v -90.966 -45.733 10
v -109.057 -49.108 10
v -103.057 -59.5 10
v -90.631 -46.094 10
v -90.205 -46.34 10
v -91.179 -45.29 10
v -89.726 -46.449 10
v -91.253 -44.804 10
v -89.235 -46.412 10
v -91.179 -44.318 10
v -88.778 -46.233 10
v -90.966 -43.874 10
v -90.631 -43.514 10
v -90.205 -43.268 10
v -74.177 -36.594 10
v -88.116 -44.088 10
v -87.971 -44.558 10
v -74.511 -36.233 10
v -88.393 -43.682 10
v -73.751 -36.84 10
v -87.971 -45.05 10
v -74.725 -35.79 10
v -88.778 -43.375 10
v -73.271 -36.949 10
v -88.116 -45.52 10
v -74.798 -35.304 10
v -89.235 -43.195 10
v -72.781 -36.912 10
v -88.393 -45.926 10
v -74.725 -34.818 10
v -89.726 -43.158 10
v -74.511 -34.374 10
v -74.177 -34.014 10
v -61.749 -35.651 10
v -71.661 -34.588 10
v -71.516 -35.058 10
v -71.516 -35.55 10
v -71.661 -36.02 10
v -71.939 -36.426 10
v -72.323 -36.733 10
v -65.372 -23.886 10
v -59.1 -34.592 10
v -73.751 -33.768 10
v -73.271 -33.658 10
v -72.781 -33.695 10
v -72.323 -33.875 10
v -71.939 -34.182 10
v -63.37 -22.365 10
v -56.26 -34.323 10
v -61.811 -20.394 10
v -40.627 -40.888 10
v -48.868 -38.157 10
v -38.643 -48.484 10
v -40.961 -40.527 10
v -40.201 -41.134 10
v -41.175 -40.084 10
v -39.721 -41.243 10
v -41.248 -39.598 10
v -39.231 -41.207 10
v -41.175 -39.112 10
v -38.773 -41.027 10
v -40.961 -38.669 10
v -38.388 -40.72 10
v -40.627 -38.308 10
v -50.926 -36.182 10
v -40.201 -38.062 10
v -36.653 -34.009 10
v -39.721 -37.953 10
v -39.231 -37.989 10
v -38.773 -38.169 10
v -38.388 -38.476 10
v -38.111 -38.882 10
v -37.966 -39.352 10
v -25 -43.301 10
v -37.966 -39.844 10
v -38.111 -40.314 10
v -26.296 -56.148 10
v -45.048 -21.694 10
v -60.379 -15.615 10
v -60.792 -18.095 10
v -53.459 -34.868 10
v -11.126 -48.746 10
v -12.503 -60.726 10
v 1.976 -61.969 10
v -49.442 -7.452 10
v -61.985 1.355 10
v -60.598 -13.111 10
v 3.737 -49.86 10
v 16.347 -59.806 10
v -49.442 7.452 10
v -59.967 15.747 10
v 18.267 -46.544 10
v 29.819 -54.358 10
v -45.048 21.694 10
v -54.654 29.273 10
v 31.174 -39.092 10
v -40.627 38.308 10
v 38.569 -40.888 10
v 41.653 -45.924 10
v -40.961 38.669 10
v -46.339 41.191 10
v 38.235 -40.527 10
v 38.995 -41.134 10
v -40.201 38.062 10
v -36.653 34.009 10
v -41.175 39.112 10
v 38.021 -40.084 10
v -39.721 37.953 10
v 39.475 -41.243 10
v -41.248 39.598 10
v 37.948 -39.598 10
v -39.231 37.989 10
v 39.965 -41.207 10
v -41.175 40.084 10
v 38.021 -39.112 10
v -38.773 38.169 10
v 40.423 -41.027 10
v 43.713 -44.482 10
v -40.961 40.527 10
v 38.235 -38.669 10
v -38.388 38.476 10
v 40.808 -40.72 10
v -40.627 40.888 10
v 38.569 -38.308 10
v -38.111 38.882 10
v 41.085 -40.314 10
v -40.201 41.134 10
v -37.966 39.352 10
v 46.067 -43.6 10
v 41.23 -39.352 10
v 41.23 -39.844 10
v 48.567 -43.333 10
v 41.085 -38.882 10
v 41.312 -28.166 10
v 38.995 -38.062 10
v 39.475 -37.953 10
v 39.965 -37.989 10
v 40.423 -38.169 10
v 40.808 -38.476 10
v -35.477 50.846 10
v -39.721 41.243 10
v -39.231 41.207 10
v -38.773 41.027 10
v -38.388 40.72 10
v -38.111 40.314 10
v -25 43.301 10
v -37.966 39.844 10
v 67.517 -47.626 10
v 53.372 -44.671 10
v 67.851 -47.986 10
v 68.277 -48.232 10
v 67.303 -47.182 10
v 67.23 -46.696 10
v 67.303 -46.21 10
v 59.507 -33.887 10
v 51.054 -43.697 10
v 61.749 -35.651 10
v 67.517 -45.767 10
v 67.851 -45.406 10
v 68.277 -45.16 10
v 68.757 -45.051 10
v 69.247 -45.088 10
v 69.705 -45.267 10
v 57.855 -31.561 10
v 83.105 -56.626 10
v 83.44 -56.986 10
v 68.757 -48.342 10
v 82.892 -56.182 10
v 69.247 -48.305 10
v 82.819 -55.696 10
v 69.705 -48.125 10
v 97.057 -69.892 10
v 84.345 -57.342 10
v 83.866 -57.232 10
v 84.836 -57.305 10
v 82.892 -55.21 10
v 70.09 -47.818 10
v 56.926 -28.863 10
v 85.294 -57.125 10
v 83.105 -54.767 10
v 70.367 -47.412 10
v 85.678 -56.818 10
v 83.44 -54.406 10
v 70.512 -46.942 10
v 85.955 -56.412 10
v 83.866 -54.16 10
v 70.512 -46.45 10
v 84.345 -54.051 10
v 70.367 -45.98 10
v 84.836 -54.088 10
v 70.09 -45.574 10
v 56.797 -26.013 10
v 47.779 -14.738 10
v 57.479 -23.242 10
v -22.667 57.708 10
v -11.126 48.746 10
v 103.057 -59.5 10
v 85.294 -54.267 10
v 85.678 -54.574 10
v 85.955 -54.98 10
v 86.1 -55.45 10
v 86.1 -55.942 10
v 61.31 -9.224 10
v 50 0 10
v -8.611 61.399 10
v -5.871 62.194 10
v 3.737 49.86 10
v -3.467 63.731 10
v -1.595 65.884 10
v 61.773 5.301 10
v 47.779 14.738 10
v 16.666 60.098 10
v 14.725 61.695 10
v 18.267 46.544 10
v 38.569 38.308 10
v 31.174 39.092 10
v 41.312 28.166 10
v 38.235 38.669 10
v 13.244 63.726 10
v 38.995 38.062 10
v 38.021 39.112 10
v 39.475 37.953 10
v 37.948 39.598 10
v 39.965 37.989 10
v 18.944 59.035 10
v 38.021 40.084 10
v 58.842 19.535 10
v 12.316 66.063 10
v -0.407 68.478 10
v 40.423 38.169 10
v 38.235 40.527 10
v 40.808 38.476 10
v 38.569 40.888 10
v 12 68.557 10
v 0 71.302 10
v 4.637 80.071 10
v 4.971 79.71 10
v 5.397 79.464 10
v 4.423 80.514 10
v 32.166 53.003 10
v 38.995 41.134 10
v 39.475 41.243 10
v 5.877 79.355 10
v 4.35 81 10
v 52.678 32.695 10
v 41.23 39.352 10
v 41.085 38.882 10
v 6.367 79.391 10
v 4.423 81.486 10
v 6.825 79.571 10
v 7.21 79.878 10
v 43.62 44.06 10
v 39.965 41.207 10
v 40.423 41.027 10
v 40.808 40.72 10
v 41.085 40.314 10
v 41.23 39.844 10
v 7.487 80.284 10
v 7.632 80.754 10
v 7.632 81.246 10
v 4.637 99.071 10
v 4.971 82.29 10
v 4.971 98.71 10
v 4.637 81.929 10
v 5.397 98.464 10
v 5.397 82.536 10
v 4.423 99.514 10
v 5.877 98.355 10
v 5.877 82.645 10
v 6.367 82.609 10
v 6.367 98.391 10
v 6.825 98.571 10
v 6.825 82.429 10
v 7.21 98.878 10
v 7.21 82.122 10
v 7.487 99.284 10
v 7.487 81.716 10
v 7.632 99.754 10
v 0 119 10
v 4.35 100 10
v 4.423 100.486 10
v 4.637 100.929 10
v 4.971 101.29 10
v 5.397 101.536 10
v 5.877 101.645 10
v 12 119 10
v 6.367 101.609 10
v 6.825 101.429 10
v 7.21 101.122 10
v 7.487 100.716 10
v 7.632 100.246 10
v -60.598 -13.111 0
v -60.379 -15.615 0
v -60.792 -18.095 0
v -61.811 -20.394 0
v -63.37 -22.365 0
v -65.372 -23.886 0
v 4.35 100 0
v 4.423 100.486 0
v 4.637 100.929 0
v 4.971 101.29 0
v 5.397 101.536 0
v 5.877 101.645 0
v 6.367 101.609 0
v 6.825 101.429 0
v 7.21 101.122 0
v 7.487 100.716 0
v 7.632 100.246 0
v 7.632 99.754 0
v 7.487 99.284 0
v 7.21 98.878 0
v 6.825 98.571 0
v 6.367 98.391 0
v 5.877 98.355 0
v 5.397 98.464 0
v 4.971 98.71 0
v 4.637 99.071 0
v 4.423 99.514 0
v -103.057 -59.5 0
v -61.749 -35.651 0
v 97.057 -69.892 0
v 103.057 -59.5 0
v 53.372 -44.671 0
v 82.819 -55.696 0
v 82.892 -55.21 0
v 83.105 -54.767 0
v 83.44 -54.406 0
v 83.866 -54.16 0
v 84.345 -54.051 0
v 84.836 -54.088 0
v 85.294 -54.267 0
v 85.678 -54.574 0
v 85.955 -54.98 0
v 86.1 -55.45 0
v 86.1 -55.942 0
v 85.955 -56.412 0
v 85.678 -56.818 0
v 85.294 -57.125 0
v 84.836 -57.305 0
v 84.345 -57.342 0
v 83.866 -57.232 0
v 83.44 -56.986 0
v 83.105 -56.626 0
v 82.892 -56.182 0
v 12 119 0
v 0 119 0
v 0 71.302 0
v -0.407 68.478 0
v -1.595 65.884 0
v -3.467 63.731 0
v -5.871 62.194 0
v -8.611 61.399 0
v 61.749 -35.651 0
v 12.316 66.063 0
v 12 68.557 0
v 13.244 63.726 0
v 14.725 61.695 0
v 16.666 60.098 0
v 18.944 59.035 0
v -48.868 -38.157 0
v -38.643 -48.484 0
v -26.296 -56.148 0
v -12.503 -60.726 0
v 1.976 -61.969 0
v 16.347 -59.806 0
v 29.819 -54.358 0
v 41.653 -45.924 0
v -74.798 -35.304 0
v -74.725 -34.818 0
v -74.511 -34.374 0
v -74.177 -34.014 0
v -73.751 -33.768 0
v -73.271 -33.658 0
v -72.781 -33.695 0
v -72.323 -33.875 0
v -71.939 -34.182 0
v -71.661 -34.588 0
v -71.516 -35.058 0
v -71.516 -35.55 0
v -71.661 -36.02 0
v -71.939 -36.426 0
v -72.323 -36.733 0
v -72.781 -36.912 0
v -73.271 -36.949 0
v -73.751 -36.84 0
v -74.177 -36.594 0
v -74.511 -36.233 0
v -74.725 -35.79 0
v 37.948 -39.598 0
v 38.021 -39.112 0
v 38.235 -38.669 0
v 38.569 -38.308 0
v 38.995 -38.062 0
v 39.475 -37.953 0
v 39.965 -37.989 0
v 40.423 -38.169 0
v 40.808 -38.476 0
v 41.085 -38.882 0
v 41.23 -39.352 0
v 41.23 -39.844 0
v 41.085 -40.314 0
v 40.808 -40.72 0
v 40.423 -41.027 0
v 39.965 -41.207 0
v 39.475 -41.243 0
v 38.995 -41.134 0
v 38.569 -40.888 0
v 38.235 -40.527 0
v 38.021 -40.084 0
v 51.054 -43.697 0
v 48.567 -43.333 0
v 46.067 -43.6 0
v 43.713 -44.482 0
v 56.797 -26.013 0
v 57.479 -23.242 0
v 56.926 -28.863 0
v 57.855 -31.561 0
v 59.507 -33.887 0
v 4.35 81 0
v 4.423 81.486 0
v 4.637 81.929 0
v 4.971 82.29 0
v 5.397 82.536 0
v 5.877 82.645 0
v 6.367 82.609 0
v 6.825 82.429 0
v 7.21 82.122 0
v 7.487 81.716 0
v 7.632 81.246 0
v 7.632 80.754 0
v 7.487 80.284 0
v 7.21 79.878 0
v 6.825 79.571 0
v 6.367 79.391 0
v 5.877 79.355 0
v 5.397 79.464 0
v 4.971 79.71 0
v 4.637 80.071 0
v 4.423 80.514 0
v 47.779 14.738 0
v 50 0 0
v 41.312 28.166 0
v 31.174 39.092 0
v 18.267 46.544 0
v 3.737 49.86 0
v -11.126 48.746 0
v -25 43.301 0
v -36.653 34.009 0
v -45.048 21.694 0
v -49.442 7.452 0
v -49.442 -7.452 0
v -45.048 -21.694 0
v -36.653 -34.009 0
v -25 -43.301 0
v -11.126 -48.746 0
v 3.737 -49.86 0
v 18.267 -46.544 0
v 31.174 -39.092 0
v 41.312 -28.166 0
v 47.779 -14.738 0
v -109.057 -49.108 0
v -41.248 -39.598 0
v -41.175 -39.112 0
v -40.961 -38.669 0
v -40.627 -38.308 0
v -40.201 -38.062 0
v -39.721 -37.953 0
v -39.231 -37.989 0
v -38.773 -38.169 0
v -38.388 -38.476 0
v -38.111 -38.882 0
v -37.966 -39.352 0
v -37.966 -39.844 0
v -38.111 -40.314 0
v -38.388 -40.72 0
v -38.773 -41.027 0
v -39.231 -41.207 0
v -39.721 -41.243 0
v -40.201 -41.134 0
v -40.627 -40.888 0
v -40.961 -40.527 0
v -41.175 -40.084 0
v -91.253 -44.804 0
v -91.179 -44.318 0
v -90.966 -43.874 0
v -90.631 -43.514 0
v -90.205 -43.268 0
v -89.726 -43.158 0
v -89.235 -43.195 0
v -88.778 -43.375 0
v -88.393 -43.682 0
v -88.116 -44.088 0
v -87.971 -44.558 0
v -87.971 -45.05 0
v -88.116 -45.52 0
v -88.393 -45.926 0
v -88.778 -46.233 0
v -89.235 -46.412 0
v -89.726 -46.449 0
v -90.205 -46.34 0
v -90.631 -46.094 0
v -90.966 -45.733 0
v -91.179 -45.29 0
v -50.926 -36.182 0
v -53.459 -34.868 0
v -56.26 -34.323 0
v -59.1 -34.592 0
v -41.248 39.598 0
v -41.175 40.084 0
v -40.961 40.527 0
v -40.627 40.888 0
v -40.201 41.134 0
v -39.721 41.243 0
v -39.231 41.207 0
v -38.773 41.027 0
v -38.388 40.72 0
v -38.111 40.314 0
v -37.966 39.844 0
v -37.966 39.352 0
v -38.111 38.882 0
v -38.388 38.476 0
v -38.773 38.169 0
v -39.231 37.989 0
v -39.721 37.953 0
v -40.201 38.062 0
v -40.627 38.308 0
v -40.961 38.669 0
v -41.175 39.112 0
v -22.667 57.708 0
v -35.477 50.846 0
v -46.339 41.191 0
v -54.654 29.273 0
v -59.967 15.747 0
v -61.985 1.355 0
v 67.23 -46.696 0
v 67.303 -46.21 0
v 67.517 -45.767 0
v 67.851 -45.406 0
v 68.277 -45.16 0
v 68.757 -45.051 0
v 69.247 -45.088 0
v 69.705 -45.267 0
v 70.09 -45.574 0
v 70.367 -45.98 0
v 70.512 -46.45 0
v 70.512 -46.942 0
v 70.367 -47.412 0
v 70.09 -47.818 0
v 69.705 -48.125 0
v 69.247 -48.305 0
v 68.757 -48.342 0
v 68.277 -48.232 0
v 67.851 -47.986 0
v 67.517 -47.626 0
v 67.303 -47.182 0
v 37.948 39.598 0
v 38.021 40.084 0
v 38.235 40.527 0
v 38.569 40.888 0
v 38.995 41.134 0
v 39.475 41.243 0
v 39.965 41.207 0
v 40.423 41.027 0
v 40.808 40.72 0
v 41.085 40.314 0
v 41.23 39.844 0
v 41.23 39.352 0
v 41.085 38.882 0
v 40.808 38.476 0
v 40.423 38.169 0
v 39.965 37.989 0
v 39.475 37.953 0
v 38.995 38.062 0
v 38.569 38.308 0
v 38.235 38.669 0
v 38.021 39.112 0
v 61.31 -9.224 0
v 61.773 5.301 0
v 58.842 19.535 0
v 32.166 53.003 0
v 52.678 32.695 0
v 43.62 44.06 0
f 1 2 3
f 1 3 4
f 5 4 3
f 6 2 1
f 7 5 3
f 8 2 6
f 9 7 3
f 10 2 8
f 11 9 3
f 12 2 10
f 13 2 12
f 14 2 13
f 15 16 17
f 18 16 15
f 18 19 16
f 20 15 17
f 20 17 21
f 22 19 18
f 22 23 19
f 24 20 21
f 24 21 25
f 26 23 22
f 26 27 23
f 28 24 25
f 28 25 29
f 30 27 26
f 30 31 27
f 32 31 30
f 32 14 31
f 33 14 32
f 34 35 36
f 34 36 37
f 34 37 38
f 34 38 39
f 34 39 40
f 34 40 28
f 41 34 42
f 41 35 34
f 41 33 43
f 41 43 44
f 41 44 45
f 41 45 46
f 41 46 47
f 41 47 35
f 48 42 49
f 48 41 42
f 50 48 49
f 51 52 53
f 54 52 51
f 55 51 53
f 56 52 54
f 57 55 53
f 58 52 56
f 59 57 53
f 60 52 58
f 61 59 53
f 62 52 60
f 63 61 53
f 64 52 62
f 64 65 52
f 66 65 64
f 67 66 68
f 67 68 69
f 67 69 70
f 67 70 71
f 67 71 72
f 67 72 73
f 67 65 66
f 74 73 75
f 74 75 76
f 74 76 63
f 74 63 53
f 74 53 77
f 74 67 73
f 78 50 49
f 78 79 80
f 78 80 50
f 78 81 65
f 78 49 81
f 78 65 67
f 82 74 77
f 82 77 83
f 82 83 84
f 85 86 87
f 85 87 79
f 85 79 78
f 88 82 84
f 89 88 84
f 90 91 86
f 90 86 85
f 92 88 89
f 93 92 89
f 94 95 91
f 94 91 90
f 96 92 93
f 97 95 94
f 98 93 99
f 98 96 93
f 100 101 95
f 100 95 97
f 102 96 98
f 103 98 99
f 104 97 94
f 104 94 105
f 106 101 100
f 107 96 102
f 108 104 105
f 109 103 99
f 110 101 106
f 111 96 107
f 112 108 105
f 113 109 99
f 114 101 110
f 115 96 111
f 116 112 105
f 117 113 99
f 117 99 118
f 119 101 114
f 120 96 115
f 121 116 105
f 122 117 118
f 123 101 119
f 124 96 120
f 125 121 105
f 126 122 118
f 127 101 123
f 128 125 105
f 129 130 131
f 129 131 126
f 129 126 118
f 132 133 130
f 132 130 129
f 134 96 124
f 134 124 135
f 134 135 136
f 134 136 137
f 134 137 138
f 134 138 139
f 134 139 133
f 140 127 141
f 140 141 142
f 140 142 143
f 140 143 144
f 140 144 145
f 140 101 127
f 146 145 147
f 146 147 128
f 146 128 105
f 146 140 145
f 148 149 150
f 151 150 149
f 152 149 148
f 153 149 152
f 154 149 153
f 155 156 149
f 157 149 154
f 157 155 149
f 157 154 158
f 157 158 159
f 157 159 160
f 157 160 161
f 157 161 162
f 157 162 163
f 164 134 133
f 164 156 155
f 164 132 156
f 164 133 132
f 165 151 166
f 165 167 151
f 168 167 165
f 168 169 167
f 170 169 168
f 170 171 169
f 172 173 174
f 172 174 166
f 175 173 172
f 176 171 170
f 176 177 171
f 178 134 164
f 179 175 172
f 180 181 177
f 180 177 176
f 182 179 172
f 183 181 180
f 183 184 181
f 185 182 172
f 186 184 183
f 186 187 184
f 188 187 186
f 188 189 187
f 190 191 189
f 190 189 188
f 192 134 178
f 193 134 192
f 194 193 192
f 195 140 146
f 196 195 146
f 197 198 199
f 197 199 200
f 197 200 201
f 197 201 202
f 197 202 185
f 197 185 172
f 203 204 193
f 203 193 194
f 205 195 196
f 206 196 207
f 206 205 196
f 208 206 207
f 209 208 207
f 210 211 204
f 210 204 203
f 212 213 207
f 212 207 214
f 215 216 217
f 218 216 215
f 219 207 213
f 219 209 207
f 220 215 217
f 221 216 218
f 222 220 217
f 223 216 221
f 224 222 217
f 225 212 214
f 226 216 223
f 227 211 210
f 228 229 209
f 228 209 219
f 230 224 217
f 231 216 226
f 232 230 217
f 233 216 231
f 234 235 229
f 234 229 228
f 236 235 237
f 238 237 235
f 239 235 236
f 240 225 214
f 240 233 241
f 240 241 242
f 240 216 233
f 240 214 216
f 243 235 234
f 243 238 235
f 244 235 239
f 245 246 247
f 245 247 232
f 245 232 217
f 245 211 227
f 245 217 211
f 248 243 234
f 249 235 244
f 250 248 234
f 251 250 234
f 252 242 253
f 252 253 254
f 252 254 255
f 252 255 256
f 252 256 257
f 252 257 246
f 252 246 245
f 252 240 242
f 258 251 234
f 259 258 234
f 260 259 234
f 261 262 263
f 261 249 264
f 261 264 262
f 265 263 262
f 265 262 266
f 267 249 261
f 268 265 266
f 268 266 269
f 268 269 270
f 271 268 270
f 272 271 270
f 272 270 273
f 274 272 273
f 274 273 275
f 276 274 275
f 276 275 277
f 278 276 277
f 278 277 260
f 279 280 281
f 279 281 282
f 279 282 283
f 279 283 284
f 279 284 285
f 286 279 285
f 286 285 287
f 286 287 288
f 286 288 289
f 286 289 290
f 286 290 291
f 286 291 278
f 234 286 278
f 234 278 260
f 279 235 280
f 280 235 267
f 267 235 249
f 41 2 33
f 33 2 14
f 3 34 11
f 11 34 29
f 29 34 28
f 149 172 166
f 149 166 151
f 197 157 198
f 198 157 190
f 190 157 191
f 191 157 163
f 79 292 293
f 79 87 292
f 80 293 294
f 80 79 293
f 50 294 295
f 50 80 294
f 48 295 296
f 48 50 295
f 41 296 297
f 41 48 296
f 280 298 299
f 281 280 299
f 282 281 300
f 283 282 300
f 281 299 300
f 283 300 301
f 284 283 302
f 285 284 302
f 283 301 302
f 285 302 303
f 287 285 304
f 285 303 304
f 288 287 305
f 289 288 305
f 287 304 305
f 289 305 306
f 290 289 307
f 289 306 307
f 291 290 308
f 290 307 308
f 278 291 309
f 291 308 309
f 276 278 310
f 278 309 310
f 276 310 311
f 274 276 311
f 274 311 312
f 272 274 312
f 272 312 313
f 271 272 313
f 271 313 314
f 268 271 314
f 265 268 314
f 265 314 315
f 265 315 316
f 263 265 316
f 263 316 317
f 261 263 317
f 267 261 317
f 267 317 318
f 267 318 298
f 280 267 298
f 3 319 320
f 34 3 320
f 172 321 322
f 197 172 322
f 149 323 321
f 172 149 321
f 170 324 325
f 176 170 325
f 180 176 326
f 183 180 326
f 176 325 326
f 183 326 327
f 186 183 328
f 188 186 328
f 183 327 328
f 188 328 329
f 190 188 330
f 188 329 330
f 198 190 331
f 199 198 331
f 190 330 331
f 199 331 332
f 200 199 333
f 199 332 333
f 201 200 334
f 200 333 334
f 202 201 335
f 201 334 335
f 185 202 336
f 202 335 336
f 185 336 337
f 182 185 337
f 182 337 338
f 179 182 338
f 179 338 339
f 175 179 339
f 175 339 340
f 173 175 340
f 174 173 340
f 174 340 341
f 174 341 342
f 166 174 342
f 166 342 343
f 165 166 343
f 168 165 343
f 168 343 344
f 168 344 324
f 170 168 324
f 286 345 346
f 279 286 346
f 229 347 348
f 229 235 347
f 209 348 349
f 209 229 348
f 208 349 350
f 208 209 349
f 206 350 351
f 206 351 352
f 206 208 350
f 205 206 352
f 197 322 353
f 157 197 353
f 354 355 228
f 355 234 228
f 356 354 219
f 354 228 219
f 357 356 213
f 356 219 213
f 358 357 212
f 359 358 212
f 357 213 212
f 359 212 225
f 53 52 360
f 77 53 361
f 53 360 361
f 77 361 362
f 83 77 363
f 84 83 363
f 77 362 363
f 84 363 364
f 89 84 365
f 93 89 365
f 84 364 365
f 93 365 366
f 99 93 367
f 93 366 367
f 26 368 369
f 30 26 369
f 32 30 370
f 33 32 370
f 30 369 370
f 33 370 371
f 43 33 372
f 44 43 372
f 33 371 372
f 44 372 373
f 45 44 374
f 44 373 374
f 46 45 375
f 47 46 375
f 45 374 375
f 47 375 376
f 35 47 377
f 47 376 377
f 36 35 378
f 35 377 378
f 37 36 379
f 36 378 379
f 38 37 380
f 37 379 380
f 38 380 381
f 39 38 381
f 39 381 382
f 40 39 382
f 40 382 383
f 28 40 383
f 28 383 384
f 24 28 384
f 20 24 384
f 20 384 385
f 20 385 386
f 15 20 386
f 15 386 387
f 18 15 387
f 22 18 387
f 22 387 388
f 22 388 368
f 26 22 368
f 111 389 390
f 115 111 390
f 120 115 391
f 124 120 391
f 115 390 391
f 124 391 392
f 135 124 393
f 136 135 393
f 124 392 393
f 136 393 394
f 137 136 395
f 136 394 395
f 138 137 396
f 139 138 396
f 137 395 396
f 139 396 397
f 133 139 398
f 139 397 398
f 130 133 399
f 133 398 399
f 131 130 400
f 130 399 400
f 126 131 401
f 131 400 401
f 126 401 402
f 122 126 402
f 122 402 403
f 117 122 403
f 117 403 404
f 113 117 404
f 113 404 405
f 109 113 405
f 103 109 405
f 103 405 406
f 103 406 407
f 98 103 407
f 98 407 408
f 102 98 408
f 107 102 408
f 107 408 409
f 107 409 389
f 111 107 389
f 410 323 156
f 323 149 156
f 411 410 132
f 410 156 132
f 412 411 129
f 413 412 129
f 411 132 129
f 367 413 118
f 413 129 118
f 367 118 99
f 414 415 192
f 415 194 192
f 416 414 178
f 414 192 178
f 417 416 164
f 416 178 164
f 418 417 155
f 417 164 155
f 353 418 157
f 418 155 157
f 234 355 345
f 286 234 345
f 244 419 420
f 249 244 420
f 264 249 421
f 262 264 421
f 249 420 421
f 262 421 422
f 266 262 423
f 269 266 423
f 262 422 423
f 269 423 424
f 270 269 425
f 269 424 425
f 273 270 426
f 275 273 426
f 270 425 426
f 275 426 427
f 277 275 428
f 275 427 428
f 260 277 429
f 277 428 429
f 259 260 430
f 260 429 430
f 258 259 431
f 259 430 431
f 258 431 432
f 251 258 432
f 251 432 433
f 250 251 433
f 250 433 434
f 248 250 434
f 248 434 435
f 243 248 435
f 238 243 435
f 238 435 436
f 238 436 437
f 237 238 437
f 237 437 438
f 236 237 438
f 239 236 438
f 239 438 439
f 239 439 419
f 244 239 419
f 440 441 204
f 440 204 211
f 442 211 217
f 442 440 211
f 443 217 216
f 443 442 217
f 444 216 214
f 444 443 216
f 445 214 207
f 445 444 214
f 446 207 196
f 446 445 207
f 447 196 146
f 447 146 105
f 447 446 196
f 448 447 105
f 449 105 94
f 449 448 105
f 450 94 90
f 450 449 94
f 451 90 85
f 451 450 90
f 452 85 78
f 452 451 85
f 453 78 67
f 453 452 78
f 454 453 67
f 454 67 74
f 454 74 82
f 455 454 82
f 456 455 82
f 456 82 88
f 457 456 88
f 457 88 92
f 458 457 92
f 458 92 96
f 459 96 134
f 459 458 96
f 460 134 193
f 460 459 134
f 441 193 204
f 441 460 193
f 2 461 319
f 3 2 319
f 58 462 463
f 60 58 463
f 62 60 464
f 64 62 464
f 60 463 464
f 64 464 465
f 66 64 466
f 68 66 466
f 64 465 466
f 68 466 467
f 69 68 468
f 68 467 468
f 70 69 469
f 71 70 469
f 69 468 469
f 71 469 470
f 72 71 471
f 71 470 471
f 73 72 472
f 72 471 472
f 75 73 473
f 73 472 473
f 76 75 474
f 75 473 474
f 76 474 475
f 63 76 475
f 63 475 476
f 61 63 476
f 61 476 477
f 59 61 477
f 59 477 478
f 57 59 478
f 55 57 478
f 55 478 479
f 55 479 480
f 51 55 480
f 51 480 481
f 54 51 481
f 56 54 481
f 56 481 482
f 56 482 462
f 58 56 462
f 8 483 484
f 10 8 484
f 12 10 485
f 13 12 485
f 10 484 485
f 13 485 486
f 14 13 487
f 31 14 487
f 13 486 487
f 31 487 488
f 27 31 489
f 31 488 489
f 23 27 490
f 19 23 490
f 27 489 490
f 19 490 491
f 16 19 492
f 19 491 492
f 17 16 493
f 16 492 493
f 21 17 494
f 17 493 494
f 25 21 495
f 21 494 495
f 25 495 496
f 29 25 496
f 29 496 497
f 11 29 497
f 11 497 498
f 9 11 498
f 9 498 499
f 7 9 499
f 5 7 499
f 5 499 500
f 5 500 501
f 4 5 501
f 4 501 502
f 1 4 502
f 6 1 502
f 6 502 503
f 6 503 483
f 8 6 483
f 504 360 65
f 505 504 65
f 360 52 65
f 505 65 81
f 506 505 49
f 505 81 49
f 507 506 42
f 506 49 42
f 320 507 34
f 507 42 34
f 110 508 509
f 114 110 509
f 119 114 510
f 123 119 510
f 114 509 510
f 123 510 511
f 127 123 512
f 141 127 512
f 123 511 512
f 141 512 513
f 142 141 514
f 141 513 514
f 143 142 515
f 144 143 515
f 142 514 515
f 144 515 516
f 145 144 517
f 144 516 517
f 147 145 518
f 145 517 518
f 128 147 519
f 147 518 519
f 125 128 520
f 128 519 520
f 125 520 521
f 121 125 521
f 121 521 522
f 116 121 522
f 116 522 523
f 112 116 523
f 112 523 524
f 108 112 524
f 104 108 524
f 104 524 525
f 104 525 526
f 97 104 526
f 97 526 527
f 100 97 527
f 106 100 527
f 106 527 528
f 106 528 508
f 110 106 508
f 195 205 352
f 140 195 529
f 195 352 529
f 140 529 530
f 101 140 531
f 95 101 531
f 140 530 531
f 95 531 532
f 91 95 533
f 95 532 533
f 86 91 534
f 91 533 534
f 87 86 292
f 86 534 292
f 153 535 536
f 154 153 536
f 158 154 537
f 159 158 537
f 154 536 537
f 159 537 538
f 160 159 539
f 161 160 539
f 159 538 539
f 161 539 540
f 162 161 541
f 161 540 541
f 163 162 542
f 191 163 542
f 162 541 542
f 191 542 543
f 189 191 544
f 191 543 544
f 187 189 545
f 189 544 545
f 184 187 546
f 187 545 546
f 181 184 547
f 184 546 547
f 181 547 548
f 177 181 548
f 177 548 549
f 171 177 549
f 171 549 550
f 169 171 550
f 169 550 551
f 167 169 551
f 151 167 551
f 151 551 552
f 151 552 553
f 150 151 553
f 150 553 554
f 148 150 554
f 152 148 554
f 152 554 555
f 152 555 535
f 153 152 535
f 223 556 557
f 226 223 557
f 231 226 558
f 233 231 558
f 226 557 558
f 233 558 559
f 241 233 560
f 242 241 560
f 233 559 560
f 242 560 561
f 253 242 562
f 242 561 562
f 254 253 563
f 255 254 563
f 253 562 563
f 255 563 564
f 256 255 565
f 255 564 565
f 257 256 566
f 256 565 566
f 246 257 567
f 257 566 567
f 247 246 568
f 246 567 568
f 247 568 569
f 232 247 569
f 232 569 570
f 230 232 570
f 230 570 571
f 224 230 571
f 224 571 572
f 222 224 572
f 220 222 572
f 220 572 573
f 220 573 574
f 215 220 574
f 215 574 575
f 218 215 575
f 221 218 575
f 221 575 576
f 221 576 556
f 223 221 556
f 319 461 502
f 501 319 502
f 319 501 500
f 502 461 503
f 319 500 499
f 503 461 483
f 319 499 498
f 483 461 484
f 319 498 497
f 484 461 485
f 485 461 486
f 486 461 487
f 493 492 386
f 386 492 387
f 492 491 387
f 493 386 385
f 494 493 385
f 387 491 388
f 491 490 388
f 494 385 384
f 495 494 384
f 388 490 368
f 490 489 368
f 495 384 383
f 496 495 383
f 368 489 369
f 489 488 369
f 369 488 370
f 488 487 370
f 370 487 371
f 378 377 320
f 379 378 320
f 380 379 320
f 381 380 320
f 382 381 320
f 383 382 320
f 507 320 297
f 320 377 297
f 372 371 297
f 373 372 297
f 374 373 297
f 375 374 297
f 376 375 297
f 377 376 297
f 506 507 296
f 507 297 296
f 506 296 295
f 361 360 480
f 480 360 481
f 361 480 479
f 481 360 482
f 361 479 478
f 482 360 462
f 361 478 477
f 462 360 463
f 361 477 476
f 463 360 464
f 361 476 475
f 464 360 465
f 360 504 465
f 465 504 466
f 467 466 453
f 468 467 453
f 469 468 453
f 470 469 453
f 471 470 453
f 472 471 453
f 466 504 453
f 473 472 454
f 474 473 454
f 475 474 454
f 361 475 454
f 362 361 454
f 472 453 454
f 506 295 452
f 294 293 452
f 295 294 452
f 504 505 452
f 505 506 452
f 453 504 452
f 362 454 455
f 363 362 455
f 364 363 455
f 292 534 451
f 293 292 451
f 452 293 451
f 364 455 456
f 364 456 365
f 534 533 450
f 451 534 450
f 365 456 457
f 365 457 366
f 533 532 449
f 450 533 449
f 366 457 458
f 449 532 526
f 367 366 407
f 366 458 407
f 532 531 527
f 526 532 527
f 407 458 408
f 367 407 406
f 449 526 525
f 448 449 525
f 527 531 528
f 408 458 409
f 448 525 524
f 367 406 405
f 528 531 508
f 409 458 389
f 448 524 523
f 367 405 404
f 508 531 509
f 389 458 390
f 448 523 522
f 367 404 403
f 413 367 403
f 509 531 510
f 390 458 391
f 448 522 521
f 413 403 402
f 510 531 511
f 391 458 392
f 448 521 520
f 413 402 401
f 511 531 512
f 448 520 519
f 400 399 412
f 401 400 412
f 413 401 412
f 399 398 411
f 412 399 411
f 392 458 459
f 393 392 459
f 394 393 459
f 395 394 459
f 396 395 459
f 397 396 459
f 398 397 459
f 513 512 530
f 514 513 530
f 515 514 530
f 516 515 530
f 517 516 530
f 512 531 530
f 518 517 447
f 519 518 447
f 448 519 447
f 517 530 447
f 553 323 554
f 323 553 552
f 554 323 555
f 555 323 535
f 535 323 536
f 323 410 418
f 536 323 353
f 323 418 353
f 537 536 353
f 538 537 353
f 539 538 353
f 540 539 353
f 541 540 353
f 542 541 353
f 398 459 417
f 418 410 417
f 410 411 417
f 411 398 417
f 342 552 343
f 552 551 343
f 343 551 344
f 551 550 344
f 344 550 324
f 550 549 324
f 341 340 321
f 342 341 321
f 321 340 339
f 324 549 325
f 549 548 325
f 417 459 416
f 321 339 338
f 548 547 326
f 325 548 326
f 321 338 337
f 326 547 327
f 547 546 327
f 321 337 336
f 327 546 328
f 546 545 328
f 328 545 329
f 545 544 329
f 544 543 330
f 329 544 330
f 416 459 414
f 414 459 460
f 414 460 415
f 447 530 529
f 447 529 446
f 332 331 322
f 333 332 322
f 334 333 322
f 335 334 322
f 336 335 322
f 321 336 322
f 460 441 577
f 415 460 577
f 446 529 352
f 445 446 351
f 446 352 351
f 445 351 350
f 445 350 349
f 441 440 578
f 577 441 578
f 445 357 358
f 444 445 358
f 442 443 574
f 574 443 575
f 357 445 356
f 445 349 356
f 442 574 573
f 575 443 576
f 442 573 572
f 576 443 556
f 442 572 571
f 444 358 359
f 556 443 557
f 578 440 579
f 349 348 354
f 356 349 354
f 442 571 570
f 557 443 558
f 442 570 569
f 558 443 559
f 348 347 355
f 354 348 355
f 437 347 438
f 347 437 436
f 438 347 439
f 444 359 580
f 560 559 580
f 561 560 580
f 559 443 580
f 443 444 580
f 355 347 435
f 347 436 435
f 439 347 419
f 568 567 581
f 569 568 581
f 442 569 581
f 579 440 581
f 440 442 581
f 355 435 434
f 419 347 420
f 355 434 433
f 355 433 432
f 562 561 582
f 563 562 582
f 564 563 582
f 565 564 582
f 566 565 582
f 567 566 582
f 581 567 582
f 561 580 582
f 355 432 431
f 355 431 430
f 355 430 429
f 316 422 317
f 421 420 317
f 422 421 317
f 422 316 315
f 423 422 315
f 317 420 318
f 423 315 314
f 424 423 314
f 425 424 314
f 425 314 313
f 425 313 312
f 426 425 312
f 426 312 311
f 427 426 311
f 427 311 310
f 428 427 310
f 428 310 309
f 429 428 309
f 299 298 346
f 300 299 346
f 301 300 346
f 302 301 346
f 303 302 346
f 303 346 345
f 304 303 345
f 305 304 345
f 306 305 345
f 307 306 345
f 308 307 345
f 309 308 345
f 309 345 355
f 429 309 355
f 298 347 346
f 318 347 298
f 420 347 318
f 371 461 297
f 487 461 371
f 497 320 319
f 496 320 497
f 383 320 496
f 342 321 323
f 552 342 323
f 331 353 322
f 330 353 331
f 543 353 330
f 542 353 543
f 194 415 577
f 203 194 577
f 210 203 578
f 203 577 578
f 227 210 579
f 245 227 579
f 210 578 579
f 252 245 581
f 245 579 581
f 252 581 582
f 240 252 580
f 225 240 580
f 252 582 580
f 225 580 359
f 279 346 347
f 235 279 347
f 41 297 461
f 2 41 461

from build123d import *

# Parameters (mm, degrees)
SKETCH_1_R             = 50
EXTRUDE_1_DEPTH        = 10
HOLE_WIZARD_M4_1_D     = 3.3
HOLE_WIZARD_M4_1_DEPTH = 10.1
HOLE_WIZARD_M4_1_TIP   = 0.991420021
FILLET_1_R             = 10


with BuildPart() as part:
    # 草图1 → 凸台-拉伸1 (new body)
    with BuildSketch(Plane.XY):
        with BuildLine():
            Line((12, 60.827625303), (12, 119))
            Line((12, 119), (0, 119))
            Line((0, 119), (0, 62))
            ThreePointArc((0, 62), (-50.42486234, 36.073996979), (-58.678268764, -20.021507806))
            Line((-58.678268764, -20.021507806), (-109.05702305, -49.107695155))
            Line((-109.05702305, -49.107695155), (-103.05702305, -59.5))
            Line((-103.05702305, -59.5), (-53.693575035, -31))
            ThreePointArc((-53.693575035, -31), (-6.02856663, -61.706210258), (46.678268764, -40.806117497))
            Line((46.678268764, -40.806117497), (97.05702305, -69.892304845))
            Line((97.05702305, -69.892304845), (103.05702305, -59.5))
            Line((103.05702305, -59.5), (53.693575035, -31))
            ThreePointArc((53.693575035, -31), (56.453428969, 25.632213279), (12, 60.827625303))
        make_face()
        Circle(SKETCH_1_R, mode=Mode.SUBTRACT)
    extrude(amount=EXTRUDE_1_DEPTH)

    # M4 螺纹孔1
    with Locations(Plane.XY.offset(10)):
        with Locations((-39.597979746, 39.597979746), (-39.597979746, -39.597979746), (39.597979746, -39.597979746), (39.597979746, 39.597979746), (-89.602540378, -44.803847577), (-73.148057707, -35.303847577), (84.468565782, -55.696152423), (68.880108514, -46.696152423), (6, 81), (6, 100)):
            Hole(HOLE_WIZARD_M4_1_D / 2, depth=HOLE_WIZARD_M4_1_DEPTH)
            with Locations((0, 0, -(HOLE_WIZARD_M4_1_DEPTH + HOLE_WIZARD_M4_1_TIP / 2))):  # 118° drill point
                Cone(0, HOLE_WIZARD_M4_1_D / 2, HOLE_WIZARD_M4_1_TIP, mode=Mode.SUBTRACT)

    # 圆角1
    fillet_1_edges = [part.edges().sort_by_distance(p)[0] for p in [
        (-58.678268764, -20.021507806, 5),
        (0, 62, 5),
        (12, 60.827625303, 5),
        (53.693575035, -31, 5),
        (46.678268764, -40.806117497, 5),
        (-53.693575035, -31, 5),
    ]]
    fillet(fillet_1_edges, radius=FILLET_1_R)


solid = part.part
